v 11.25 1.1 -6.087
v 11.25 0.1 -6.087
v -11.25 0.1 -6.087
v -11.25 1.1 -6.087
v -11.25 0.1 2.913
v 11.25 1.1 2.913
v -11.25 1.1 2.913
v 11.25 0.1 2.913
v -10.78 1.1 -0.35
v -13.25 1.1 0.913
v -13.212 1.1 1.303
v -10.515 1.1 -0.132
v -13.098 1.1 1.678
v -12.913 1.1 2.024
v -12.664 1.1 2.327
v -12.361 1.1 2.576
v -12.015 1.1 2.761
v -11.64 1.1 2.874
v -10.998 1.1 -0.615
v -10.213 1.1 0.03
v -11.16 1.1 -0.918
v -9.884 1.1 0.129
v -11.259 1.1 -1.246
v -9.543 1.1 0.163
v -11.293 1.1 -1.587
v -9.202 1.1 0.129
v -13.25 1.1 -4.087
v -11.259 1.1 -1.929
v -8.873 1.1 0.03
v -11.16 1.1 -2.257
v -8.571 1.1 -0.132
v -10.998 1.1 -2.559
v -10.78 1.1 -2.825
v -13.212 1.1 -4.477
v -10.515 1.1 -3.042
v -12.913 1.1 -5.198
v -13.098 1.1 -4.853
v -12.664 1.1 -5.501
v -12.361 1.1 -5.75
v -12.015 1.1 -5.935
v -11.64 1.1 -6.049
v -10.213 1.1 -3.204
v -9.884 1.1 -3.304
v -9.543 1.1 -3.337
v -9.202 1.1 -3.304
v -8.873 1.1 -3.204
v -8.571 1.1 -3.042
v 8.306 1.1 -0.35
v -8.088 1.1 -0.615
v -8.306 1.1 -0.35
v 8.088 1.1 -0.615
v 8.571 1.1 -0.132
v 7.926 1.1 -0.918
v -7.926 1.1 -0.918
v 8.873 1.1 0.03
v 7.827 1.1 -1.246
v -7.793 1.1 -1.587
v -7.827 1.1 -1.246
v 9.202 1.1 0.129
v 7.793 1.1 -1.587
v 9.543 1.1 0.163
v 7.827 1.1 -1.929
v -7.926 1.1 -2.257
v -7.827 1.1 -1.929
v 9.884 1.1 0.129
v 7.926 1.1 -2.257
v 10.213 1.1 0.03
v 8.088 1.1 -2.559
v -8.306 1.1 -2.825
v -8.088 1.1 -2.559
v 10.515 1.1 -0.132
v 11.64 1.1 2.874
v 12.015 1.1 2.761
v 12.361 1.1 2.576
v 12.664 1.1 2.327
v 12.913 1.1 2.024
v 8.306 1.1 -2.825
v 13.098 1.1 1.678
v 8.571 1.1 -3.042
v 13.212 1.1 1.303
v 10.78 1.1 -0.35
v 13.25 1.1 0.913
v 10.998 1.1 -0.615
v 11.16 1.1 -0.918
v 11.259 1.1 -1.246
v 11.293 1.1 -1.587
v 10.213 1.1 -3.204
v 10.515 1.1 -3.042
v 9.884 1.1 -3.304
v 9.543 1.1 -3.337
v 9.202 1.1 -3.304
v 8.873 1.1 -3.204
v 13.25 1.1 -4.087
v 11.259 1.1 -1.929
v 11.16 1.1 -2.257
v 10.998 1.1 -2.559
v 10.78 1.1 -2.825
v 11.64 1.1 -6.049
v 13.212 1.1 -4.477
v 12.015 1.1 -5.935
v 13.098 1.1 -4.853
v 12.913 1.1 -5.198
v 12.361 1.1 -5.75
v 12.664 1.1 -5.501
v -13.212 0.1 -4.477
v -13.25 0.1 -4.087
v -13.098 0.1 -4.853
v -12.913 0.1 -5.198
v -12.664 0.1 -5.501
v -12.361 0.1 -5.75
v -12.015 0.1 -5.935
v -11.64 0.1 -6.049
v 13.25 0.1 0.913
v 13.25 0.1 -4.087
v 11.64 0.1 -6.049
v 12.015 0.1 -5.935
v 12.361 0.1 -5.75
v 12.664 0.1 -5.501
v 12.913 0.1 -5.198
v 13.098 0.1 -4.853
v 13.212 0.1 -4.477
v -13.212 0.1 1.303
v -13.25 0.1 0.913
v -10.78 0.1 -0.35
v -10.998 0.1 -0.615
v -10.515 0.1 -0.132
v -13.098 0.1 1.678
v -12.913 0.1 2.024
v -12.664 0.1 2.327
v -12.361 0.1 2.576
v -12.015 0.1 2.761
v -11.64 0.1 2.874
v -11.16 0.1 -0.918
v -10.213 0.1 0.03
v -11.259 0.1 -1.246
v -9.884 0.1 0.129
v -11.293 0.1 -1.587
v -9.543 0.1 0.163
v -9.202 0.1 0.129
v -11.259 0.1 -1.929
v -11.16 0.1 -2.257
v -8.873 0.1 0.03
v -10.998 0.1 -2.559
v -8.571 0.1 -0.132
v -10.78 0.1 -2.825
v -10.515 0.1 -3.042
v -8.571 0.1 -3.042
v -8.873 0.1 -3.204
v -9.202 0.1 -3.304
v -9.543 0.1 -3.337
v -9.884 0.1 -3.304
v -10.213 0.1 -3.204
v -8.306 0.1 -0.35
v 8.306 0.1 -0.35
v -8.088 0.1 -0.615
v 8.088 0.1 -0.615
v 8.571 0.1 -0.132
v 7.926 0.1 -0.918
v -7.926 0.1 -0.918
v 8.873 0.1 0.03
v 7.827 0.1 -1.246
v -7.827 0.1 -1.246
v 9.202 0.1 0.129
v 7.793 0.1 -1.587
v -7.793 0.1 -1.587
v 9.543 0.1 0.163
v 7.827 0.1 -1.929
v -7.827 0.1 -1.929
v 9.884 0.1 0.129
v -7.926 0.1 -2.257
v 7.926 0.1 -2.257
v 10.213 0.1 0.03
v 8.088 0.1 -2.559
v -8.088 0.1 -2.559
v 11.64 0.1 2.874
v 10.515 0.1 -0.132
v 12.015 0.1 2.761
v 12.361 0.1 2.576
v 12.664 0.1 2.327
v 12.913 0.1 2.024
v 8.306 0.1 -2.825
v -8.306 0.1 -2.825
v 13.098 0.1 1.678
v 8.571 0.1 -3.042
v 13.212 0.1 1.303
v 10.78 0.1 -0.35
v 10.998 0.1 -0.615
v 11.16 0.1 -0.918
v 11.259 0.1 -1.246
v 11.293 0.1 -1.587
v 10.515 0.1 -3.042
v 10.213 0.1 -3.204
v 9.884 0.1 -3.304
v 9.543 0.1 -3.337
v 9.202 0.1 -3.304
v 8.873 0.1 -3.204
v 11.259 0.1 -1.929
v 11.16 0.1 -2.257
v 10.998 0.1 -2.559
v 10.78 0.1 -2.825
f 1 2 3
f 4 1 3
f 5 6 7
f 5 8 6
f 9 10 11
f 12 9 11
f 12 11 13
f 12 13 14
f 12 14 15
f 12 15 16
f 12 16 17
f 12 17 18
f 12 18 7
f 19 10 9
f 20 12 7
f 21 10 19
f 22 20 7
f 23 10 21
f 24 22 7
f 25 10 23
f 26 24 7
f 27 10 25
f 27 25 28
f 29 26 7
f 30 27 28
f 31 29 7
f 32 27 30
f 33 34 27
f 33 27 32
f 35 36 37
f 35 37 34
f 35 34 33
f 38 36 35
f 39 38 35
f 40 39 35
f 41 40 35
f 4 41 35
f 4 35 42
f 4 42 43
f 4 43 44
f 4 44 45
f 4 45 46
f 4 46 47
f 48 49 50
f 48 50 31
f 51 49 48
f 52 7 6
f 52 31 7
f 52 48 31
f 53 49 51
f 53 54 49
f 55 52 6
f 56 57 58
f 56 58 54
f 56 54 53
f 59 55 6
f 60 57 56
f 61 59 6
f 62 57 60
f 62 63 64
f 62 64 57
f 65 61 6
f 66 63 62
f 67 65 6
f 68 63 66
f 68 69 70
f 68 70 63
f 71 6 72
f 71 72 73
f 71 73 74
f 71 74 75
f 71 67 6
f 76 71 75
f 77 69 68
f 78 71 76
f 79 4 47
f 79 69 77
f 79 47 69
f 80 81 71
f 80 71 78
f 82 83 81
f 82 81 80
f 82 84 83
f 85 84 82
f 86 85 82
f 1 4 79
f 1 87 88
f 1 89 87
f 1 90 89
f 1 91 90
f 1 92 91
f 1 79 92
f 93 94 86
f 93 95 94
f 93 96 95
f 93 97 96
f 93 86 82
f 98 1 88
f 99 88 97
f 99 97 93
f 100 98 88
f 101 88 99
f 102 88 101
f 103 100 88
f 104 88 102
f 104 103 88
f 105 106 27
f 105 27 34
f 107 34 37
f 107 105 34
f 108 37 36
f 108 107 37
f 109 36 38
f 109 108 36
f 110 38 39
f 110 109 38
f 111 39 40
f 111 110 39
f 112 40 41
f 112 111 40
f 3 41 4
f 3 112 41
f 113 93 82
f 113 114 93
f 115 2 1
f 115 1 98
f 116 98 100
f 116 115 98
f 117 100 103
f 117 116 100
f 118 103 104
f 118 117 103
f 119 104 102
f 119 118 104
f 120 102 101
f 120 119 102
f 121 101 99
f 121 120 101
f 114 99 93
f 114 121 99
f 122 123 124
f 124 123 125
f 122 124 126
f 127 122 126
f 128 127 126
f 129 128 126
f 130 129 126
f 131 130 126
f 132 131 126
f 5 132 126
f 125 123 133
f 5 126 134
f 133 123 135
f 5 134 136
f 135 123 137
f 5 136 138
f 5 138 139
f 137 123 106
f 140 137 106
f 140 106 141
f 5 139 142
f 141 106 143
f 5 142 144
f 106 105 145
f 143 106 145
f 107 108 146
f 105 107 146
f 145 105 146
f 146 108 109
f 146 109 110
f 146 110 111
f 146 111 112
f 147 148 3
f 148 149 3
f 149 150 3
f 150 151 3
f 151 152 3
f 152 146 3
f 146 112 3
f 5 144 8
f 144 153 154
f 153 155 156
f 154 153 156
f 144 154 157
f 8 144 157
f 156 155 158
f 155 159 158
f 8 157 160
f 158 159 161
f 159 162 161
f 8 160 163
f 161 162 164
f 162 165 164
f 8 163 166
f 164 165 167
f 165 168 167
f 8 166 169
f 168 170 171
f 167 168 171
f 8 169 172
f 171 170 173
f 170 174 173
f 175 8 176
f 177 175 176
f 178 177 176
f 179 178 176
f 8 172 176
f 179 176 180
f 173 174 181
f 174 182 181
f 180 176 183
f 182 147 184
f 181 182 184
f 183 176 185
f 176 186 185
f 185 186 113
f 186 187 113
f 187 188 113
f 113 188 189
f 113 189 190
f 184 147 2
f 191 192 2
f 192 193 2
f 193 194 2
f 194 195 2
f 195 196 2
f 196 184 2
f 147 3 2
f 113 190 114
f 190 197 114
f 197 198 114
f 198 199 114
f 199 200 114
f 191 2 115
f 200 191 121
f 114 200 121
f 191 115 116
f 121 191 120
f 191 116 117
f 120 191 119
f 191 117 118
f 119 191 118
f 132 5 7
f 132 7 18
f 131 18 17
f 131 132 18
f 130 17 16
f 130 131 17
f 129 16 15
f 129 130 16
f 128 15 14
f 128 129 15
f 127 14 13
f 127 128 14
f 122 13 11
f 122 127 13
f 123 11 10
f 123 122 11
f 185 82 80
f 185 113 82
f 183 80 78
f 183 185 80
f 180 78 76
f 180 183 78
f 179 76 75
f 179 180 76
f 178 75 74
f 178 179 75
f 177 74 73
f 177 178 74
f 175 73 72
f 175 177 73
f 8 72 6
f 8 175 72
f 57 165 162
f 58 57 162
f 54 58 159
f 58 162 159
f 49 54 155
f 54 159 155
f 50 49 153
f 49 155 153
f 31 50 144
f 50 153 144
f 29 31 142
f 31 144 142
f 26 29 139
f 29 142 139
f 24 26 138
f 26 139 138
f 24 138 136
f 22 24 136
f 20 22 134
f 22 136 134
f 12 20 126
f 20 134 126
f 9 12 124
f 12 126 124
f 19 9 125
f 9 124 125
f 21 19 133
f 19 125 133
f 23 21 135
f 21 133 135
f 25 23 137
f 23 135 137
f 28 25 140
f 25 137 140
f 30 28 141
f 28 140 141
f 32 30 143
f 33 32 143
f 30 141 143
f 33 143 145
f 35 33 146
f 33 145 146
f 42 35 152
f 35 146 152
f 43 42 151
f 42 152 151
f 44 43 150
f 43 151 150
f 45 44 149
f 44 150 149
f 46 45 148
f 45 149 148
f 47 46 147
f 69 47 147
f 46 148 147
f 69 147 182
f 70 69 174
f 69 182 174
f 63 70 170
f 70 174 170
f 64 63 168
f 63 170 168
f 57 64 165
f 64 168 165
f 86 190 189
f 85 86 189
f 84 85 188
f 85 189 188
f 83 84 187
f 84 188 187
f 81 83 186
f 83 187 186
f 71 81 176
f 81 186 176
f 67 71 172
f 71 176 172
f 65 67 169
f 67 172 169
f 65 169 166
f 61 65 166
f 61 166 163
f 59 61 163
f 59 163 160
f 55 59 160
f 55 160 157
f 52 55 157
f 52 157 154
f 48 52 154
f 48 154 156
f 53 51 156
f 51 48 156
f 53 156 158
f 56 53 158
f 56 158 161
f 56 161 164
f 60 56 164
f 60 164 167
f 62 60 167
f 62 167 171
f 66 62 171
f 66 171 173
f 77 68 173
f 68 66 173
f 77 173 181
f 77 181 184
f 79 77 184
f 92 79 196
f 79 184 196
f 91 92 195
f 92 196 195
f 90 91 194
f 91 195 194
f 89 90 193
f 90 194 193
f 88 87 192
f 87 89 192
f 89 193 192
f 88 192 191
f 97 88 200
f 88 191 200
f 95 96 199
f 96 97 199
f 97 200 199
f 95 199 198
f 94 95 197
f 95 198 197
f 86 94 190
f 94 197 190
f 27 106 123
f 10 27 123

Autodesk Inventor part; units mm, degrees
ref_plane "YZ Plane" through (0, 0, 0) normal (1, 0, 0) x (0, 1, 0)
ref_plane "XZ Plane" through (0, 0, 0) normal (0, 1, 0) x (-1, 0, 0)
ref_plane "XY Plane" through (0, 0, 0) normal (0, 0, 1) x (1, 0, 0)
ref_plane "Płaszczyzna konstrukcyjna1" through (0, 0.1, -1.5872) normal (0, 1, 0) x (1, 0, 0)
sketch "Szkic3" plane through (0, 0.1, -1.5872) normal (0, 1, 0) x (1, 0, 0)
  line L0 (6, 4.5) -> (-6, 4.5)
  line L1 (-6, 4.5) -> (-6, -4.5)
  line L2 (-6, -4.5) -> (6, -4.5)
  line L3 (6, -4.5) -> (6, 4.5)
  line L4 (9.543, 0) -> (-12.3472, 0)
  line L5 (0, 10.0787) -> (0, -13.253)
  line L6 (6, 4.5) -> (11.25, 4.5)
  line L7 (13.25, 2.5) -> (13.25, -2.5)
  line L8 (11.25, -4.5) -> (6, -4.5)
  line L9 (6, -4.5) -> (6, 4.5)
  arc A0 (13.25, 2.5) -> (11.25, 4.5) centre (11.25, 2.5) ccw
  arc A1 (11.25, -4.5) -> (13.25, -2.5) centre (11.25, -2.5) ccw
  line L10 (-13.25, 2.5) -> (-13.25, -2.5)
  arc A2 (-11.25, 4.5) -> (-13.25, 2.5) centre (-11.25, 2.5) ccw
  line L11 (-6, 4.5) -> (-11.25, 4.5)
  arc A3 (-13.25, -2.5) -> (-11.25, -4.5) centre (-11.25, -2.5) ccw
  line L12 (-11.25, -4.5) -> (-6, -4.5)
  line L13 (-13.25, 0.45) -> (-9, 0.45)
  circle A4 centre (9.543, 0) radius 1.75
  circle A5 centre (-9.543, 0) radius 1.75
  point P0 (0, 0)
  point P1 (13.25, 4.5)
  dimension "d26" = 12
  dimension "d25" = 9
  dimension "d24" = 4.5
  dimension "d23" = 6
  dimension "d22" = 7.25
  dimension "d20" = 2
  dimension "d19" = 4.25
  dimension "d18" = 4.05
  dimension "d16" = 19.086
  dimension "d21" = 3.707
  dimension "d17" = 3.5
  dimension "d15" = 3.5
extrude "Wyciągnięcie proste3" add sketch "Szkic3" along normal blind 1 contours L3 L4 L5 L0 | L6 A0 L7 A1 L8 L3 | L5 L4 L1 L0 | L3 L2 L5 L4 | L1 L4 A5 L13 L10 A2 L11 | L5 L2 L1 L4 | L1 L12 A3 L10 L13 A5 L4
properties part number "prent1"
